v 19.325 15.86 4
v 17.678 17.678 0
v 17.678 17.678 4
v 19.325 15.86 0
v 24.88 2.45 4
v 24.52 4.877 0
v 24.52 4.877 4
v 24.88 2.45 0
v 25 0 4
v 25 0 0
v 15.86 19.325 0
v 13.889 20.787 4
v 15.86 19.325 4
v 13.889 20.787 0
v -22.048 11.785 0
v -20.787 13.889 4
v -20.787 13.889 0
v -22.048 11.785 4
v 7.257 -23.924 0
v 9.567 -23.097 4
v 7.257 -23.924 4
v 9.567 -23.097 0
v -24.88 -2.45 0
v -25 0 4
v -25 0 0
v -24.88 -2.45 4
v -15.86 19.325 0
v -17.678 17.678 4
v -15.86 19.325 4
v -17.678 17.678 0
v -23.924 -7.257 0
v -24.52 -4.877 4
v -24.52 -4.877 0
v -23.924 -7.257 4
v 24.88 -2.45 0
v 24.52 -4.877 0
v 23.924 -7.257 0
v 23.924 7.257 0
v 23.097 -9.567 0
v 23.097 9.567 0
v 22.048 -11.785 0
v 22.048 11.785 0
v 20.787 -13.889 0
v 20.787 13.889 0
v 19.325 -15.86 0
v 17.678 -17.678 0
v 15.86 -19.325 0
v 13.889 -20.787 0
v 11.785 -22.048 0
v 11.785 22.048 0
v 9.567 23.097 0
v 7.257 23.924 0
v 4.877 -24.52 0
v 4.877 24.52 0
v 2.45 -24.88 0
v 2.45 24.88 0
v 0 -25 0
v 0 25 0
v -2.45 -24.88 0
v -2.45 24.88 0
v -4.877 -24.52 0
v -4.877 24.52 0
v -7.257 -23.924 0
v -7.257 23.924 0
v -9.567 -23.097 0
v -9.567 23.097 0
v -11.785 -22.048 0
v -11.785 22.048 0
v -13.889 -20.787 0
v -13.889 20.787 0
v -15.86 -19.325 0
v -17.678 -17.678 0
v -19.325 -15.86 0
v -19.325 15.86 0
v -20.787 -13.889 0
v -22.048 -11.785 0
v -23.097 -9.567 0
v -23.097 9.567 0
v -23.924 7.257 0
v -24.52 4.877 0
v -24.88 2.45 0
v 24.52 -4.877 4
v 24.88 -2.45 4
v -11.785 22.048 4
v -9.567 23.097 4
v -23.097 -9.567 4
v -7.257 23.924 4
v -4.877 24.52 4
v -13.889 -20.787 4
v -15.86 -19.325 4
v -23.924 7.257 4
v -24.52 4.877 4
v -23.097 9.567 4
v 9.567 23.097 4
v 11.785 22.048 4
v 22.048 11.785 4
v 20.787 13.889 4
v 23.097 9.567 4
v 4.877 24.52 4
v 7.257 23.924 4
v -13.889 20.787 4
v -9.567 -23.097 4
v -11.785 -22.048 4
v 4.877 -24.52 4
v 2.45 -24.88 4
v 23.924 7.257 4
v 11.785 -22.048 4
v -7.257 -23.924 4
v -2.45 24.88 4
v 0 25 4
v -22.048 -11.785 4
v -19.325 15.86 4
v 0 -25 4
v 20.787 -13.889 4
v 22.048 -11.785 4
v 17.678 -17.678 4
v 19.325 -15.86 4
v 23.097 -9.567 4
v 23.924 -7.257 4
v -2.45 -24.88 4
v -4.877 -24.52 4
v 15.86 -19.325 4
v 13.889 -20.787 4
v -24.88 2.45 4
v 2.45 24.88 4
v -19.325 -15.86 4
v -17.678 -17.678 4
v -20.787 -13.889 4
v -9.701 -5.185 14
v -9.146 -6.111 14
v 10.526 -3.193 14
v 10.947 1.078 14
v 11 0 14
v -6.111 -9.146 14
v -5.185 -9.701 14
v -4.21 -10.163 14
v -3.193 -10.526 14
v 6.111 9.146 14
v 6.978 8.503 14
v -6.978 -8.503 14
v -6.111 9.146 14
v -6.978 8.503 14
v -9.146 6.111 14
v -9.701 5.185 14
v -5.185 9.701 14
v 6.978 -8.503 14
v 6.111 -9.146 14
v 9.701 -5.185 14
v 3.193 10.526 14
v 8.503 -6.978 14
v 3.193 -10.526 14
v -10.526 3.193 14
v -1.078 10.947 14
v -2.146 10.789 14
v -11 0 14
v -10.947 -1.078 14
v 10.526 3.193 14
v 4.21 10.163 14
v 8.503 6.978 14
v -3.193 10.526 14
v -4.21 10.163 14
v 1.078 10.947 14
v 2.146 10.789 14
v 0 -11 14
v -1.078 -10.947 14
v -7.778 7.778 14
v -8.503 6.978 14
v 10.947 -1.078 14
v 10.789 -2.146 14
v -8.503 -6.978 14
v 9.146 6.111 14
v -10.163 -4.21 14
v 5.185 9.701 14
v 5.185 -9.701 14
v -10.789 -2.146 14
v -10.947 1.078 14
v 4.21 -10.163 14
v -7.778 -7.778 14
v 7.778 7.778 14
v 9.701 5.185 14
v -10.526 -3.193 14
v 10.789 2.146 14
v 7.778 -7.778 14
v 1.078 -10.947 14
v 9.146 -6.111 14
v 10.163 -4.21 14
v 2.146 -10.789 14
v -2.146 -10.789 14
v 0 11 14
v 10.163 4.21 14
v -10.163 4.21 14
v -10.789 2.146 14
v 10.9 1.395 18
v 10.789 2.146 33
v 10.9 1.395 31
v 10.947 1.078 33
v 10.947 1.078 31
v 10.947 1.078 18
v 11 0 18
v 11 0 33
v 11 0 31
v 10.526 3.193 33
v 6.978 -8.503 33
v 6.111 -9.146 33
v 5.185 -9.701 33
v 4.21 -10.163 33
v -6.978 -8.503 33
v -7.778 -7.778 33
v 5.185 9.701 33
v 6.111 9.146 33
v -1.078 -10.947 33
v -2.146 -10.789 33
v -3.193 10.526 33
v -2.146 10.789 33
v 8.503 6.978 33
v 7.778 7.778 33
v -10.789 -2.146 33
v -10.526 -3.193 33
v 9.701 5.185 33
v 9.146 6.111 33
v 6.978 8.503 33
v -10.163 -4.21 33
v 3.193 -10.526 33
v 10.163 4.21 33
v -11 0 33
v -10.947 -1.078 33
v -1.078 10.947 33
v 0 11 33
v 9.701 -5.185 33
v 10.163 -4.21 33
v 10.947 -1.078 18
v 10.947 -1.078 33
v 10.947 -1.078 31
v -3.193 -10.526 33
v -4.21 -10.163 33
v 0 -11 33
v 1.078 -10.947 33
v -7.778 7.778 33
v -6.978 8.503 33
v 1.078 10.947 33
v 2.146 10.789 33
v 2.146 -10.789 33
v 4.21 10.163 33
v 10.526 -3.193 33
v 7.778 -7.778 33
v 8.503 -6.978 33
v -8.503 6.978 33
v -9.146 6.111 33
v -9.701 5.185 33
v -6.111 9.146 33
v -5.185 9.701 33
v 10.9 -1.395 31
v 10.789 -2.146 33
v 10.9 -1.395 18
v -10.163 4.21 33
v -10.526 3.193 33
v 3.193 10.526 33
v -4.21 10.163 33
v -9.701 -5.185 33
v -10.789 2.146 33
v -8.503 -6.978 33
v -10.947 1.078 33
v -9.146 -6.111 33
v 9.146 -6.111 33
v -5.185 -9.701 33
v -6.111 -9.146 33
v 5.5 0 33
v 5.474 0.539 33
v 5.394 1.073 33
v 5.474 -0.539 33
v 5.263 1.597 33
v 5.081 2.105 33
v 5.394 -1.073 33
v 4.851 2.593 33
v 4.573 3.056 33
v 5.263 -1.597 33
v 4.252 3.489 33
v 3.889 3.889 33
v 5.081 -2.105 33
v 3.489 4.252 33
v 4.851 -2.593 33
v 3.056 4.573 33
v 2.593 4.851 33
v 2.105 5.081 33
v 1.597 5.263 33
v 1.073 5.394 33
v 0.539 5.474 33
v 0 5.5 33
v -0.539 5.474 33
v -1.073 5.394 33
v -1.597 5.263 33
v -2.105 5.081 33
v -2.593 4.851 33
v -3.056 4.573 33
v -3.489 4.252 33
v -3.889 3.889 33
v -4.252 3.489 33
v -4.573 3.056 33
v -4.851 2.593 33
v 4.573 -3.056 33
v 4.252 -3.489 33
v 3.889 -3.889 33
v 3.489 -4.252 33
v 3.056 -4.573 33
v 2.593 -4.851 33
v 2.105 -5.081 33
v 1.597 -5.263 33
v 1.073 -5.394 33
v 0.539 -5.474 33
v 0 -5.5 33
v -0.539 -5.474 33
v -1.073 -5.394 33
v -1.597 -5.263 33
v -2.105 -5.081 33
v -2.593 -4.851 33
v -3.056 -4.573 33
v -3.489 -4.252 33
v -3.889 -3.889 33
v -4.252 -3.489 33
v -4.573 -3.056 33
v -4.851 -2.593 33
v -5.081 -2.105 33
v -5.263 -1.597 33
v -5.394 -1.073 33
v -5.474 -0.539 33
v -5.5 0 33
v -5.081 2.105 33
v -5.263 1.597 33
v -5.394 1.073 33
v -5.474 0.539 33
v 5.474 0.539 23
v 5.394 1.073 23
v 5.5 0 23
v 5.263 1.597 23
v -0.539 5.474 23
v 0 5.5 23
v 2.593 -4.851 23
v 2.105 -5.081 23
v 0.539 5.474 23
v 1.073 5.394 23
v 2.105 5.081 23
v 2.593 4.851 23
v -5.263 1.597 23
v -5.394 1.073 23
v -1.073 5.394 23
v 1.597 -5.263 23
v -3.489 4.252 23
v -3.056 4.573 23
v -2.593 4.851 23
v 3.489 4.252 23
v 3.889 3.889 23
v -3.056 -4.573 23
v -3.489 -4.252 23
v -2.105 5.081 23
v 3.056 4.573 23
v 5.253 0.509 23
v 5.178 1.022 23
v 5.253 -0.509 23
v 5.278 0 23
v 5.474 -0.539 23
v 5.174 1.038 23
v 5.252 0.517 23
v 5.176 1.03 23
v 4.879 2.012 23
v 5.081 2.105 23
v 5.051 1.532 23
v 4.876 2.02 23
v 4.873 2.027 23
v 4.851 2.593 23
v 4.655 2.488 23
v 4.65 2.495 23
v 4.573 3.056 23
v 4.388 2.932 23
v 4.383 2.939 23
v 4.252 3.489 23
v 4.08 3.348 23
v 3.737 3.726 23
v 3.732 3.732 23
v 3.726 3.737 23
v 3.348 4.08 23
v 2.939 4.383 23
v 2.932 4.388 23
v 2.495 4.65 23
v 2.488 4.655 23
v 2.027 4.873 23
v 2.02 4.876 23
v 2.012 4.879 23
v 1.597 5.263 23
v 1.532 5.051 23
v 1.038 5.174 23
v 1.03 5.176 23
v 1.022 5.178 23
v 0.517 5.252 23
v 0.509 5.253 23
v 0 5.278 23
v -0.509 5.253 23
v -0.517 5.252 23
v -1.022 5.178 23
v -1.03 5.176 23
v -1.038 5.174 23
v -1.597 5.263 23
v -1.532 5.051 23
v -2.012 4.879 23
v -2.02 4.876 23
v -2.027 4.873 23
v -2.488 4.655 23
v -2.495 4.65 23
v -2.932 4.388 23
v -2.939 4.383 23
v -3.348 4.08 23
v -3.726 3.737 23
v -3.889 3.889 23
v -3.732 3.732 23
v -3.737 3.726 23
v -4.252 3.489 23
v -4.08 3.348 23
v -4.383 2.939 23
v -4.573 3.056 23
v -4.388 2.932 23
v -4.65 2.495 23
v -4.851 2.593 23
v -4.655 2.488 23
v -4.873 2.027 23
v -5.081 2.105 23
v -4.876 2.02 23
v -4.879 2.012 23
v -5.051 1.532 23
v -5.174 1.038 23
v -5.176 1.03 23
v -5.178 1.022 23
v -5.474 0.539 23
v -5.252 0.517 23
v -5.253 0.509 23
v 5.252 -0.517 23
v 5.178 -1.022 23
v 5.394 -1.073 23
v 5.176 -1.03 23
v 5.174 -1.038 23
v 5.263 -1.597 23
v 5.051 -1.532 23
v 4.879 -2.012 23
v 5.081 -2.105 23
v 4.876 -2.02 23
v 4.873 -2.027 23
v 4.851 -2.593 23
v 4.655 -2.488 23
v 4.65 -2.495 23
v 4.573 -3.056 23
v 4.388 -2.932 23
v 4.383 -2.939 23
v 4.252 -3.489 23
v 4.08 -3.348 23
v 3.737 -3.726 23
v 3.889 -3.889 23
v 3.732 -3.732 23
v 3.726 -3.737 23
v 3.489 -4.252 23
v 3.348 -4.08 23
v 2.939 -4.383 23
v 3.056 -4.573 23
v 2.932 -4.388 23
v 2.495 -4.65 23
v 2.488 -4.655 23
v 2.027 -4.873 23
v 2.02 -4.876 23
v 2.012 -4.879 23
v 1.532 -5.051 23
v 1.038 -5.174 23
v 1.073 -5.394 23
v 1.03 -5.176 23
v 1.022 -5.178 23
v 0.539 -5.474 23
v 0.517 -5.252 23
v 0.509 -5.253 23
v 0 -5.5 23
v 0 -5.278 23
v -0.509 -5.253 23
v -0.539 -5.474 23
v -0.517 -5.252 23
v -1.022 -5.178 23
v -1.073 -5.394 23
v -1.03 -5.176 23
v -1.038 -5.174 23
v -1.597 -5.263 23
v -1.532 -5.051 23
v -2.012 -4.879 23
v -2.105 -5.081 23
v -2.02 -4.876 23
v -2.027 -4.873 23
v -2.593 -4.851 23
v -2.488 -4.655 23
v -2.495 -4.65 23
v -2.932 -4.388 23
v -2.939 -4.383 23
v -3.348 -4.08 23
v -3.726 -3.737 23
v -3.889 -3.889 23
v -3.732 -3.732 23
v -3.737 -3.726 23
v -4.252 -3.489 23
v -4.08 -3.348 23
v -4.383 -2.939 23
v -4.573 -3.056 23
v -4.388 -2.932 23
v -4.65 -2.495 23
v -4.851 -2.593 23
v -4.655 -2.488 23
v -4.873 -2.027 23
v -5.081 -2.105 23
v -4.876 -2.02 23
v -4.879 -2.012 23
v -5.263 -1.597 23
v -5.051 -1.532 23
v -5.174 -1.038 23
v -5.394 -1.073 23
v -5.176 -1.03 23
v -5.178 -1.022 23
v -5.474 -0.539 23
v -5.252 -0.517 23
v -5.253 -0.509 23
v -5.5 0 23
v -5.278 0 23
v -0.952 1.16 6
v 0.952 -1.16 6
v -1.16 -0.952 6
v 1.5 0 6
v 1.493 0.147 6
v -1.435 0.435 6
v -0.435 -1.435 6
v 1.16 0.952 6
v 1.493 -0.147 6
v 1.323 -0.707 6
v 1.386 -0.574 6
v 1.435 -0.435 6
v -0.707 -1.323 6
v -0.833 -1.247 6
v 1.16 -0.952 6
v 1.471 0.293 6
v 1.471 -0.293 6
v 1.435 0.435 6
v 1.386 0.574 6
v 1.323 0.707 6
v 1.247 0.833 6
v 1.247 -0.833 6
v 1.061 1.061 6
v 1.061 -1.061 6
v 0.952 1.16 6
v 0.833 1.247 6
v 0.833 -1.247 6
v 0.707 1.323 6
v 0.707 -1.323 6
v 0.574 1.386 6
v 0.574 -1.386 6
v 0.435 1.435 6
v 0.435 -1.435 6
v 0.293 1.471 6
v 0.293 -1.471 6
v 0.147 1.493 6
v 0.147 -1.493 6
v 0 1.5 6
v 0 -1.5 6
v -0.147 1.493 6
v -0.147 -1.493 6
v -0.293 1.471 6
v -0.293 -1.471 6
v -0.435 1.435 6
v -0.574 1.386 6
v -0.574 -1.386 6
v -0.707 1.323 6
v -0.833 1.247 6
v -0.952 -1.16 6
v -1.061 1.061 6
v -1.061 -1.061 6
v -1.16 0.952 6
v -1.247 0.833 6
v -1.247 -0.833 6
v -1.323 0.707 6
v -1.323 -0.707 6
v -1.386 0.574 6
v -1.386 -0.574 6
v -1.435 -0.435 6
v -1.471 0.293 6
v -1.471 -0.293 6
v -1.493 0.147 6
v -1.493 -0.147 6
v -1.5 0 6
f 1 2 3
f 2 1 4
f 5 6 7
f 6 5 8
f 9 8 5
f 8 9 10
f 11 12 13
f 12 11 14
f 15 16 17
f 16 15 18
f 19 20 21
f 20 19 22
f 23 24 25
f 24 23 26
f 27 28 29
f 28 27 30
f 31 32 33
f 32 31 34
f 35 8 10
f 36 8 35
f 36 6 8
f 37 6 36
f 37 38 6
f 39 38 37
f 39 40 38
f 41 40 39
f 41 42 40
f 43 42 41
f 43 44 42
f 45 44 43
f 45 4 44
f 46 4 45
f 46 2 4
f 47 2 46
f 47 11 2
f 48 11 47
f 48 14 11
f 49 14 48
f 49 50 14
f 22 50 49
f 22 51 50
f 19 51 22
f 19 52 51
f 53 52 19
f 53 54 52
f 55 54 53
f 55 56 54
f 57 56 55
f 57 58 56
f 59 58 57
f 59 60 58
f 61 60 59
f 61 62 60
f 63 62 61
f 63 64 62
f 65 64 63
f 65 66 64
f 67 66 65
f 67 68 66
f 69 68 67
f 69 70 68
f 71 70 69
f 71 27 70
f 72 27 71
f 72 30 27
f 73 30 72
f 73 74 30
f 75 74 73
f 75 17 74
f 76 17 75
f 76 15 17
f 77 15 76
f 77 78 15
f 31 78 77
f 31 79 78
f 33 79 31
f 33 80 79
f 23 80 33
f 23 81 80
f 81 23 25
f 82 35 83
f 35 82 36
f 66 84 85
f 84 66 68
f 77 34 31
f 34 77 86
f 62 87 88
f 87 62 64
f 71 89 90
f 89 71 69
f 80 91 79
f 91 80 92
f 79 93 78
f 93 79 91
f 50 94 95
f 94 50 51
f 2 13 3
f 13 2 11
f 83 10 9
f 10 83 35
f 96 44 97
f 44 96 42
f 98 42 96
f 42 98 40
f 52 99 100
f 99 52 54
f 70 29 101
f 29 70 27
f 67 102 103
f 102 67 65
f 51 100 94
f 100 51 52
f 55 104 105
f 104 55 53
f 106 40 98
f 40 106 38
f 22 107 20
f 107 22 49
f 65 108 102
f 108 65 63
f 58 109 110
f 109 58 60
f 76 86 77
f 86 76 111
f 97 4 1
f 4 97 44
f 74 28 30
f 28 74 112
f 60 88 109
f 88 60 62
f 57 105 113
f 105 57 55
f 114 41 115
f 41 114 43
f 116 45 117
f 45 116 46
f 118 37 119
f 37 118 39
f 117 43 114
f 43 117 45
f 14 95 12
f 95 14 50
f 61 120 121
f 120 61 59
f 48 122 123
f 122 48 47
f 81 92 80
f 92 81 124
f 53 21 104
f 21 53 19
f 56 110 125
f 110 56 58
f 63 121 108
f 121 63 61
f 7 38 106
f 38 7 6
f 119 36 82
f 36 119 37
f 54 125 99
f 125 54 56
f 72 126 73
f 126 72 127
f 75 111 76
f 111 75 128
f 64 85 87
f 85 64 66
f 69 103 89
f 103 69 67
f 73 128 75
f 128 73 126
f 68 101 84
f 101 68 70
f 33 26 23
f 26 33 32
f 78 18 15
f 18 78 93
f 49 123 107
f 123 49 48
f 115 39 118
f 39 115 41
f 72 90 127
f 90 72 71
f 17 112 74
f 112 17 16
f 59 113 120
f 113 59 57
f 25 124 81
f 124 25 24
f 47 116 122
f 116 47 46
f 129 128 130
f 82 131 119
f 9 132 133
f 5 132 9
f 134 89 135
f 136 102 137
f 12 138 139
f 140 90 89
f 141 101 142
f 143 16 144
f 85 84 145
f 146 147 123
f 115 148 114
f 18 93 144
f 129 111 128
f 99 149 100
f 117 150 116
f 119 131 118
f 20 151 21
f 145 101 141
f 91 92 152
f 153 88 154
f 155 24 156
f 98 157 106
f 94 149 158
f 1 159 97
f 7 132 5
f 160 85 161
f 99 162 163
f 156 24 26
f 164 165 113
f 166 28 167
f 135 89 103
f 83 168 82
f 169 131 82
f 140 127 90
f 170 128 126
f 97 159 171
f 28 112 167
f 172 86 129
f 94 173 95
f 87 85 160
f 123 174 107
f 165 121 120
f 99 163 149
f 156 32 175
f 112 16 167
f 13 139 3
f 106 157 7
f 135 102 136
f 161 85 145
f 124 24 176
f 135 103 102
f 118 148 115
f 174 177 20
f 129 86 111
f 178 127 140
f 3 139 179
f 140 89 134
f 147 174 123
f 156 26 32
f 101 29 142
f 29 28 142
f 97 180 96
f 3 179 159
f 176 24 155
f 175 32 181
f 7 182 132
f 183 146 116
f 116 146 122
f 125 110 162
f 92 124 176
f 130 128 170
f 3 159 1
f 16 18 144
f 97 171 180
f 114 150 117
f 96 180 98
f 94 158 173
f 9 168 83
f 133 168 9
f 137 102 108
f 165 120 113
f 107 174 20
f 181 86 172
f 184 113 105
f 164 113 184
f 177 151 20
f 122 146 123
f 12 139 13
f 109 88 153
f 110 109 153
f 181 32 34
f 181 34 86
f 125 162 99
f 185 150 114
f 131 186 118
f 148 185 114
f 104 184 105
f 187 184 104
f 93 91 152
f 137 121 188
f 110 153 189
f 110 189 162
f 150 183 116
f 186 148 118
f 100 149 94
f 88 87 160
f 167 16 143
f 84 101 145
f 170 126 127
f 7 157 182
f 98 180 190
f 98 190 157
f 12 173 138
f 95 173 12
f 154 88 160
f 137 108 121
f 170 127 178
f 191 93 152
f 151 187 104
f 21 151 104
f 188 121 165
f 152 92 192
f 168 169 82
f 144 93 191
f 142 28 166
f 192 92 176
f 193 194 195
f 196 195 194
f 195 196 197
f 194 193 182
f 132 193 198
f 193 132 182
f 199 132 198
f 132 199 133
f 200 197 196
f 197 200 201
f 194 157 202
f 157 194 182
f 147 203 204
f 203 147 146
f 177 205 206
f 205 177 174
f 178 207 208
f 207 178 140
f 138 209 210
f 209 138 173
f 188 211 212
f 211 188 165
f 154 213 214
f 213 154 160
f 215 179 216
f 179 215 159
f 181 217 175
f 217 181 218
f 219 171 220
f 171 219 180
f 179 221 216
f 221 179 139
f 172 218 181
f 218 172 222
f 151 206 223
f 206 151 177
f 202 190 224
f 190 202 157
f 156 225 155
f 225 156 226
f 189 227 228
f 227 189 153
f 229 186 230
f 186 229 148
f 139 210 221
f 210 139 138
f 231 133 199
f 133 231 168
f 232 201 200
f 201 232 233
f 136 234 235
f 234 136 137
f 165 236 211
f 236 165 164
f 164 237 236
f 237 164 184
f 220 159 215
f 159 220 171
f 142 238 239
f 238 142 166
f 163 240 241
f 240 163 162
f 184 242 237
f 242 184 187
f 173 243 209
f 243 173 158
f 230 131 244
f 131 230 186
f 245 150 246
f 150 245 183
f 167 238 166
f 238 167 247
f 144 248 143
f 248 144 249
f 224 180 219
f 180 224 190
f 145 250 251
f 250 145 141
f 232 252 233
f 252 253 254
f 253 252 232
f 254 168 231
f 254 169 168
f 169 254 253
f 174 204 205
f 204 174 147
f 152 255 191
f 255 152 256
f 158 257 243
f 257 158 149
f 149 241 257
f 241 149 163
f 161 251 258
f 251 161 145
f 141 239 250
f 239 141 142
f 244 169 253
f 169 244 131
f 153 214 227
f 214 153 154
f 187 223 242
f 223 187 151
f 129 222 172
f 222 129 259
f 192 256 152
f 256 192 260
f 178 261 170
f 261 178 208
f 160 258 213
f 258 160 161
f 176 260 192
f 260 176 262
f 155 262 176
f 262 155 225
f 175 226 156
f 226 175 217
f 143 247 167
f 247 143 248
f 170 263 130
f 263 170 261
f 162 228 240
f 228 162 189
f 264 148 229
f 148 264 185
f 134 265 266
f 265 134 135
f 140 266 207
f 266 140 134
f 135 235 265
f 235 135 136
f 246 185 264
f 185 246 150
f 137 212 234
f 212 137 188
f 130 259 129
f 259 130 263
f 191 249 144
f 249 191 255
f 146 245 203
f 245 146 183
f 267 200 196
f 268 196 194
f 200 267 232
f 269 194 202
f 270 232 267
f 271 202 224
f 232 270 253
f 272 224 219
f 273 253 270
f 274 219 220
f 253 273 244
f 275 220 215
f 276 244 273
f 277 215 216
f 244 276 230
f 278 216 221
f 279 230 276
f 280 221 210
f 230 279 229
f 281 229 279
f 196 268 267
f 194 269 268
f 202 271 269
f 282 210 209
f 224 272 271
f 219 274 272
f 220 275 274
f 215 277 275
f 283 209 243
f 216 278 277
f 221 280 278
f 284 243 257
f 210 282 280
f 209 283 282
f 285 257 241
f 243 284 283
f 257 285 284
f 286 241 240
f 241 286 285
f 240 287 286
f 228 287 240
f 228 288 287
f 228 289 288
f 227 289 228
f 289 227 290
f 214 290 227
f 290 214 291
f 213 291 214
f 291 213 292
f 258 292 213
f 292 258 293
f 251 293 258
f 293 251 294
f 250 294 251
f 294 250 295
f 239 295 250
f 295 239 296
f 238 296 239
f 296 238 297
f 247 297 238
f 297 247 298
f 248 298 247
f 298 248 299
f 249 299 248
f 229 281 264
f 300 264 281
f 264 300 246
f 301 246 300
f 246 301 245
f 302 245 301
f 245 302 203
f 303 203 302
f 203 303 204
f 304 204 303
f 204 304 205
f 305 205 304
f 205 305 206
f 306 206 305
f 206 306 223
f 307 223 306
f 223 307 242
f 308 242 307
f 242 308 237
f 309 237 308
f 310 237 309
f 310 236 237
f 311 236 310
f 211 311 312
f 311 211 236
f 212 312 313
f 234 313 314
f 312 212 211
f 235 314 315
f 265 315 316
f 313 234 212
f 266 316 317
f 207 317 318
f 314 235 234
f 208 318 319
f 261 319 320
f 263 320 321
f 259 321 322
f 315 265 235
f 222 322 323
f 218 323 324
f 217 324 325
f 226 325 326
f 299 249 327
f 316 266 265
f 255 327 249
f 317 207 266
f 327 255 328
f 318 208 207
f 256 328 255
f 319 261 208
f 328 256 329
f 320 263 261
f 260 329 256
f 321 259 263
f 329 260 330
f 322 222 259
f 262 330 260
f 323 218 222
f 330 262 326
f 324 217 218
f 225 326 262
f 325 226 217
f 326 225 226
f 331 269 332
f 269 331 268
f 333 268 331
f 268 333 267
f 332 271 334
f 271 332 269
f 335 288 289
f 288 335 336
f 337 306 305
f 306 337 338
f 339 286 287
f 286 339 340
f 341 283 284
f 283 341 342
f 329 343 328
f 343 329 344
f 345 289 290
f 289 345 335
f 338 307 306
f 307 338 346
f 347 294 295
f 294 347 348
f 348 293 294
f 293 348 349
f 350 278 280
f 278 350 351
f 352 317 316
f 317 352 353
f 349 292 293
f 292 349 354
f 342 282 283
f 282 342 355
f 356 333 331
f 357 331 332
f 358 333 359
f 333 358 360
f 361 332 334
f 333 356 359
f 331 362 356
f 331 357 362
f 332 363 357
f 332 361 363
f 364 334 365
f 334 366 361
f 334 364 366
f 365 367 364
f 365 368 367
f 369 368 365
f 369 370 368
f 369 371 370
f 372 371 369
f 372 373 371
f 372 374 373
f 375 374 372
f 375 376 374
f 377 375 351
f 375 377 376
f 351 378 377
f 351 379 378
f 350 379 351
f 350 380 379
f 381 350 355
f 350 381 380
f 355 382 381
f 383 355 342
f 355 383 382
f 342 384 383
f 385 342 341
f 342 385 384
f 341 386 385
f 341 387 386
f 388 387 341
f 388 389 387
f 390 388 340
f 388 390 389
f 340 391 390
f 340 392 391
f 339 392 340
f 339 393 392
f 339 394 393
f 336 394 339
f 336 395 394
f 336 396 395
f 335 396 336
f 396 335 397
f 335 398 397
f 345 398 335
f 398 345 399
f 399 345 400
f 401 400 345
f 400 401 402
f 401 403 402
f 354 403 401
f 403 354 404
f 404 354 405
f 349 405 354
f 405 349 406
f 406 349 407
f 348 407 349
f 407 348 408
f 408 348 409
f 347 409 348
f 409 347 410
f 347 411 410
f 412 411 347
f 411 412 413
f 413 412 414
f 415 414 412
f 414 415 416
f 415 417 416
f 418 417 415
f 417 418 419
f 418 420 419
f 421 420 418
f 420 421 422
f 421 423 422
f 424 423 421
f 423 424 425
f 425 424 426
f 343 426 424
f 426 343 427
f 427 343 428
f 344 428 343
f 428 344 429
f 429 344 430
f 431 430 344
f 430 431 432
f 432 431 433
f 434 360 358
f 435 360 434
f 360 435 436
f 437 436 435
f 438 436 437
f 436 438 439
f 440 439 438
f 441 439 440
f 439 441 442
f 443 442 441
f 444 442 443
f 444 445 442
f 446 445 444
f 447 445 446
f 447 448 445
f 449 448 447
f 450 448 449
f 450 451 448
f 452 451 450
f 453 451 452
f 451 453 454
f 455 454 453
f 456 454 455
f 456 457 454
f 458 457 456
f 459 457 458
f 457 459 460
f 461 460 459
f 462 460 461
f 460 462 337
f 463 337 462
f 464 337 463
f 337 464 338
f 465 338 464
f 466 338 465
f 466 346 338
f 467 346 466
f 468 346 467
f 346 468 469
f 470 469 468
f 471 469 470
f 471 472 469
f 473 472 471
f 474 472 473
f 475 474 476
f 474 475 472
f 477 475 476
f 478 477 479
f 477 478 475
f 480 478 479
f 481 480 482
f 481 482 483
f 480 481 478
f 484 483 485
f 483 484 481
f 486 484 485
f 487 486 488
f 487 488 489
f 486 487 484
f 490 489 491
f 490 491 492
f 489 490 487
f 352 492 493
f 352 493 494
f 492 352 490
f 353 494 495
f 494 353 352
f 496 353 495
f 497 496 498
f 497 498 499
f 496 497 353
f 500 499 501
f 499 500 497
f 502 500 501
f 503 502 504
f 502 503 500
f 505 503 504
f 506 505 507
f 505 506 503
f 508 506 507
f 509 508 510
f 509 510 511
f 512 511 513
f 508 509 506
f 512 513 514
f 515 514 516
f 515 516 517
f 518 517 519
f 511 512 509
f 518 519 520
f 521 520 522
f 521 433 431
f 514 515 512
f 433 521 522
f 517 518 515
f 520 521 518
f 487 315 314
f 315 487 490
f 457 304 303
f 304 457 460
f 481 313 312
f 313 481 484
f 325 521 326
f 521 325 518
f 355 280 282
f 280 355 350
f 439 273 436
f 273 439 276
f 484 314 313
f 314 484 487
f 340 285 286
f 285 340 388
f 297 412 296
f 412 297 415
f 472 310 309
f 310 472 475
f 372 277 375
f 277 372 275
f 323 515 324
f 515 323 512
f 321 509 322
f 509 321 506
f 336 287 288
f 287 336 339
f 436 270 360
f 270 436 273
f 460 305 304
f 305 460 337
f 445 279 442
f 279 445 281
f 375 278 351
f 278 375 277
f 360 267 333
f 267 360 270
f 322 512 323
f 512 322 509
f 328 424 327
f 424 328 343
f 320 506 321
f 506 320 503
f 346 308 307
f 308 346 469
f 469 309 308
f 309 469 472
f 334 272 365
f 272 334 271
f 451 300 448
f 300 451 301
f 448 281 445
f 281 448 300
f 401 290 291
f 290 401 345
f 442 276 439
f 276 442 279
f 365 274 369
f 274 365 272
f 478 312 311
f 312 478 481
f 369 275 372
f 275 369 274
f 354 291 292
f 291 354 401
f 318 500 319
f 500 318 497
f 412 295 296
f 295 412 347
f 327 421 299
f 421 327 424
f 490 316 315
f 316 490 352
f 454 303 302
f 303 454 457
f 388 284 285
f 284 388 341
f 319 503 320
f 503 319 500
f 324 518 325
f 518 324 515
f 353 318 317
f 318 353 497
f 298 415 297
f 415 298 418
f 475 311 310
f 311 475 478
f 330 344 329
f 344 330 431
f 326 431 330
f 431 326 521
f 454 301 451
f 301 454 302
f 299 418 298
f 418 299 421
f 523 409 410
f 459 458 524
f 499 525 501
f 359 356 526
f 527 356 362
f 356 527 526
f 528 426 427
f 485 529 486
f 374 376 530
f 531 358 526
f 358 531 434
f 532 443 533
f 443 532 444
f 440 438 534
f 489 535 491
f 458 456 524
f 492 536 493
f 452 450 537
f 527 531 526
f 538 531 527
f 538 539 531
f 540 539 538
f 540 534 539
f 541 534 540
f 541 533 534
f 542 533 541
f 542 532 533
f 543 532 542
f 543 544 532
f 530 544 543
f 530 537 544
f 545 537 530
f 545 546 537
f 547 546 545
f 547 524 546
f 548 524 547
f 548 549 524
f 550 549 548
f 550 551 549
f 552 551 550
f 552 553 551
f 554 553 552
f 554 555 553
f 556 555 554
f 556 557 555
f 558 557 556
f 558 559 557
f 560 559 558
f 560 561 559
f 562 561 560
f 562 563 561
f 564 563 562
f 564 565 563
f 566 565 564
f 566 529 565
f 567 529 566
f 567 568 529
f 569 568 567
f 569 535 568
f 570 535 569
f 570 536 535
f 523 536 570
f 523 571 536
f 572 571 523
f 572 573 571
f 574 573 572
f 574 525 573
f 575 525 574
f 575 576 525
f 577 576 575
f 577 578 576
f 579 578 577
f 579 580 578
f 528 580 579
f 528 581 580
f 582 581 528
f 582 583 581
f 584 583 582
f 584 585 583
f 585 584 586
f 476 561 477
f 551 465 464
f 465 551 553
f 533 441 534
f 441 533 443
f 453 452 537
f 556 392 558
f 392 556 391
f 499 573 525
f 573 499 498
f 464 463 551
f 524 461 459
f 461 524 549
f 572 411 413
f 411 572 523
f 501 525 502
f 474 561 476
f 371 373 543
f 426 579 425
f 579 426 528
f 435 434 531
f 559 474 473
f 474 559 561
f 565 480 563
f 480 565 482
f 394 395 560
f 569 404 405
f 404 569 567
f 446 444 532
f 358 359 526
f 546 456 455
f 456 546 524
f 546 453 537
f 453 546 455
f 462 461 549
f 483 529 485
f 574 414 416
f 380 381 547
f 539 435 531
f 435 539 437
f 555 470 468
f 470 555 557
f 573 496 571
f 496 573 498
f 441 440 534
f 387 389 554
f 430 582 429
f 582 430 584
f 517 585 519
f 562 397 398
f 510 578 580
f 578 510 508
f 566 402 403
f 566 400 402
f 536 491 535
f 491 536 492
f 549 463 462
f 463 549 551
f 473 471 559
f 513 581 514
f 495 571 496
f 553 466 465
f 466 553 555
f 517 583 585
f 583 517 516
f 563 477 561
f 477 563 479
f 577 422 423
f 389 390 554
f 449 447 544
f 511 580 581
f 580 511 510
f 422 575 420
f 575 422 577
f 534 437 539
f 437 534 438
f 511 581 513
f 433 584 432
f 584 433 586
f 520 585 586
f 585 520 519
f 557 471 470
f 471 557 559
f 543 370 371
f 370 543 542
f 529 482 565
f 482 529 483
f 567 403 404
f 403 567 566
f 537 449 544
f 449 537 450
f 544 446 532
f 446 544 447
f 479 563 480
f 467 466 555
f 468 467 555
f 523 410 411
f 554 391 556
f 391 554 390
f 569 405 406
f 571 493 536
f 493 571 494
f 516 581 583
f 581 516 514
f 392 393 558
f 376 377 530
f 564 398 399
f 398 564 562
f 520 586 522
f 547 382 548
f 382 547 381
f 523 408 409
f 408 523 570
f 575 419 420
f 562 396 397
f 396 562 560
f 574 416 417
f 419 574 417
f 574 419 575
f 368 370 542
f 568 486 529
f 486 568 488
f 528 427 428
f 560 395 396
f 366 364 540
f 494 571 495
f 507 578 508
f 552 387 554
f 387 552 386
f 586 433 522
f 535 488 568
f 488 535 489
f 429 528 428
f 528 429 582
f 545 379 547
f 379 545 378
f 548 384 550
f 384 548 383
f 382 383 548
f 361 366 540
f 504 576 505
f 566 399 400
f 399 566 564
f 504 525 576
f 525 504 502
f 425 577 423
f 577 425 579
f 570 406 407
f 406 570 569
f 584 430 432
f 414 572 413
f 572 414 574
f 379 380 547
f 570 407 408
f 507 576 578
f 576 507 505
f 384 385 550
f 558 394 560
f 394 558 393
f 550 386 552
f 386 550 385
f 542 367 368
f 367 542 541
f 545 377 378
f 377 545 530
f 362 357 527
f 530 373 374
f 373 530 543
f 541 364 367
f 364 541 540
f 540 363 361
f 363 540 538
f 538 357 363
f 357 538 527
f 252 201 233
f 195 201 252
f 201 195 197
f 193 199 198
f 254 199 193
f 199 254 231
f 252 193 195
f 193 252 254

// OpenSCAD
// --- Dimensions ---
base_diameter = 50.0;       // Diameter of the base disc
base_height = 4.0;          // Height of the base disc
cone_bottom_dia = 50.0;     // Diameter at the bottom of the cone (z=4)
cone_top_dia = 22.0;        // Diameter at the top of the cone (z=14)
cone_height = 10.0;         // Height of the cone section (14 - 4)
column_diameter = 22.0;      // Diameter of the top column
column_height = 19.0;        // Height of the column (33 - 14)
total_height = 33.0;        // Total height of the object

// Tube Seat Dimensions
seat_top_dia = 11.0;        // Diameter of the cylindrical part of the seat
seat_top_z = 33.0;          // Z-coordinate at the top of the seat
seat_mid_z = 23.0;          // Z-coordinate where seat transitions to cone
seat_mid_dia = 11.0;        // Diameter at the transition point
seat_bottom_dia = 3.0;      // Diameter at the tip of the seat cone
seat_bottom_z = 6.0;        // Z-coordinate at the tip of the seat cone

// Viewing Window Dimensions
window_width_y = 4.0;       // Width of the window in Y direction
window_height_start = 18.0; // Z-coordinate where window starts
window_height_end = 30.0;   // Z-coordinate where window ends
window_offset_x = 0.01;     // Small offset to ensure clean cut

// --- Parameters ---
$fn = 64;

// --- Main Construction ---

difference() {
    // THE SOLID BODY
    union() {
        // 1. The Base Disc
        cylinder(d = base_diameter, h = base_height);

        // 2. The Cone Section
        translate([0, 0, base_height])
        cylinder(d1 = cone_bottom_dia, d2 = cone_top_dia, h = cone_height);

        // 3. The Top Column
        translate([0, 0, base_height + cone_height])
        cylinder(d = column_diameter, h = column_height);
    }

    // THE TUBE SEAT (Subtracted)
    // Part 1: Cylindrical seat (z=23 to z=33)
    translate([0, 0, seat_mid_z])
    cylinder(d = seat_top_dia, h = seat_top_z - seat_mid_z + 1);
    
    // Part 2: Conical seat (z=6 to z=23)
    translate([0, 0, seat_bottom_z])
    cylinder(d1 = seat_bottom_dia, d2 = seat_mid_dia, h = seat_mid_z - seat_bottom_z + 1);

    // THE VIEWING WINDOW (Subtracted)
    // The window is cut through the column wall on the +X side.
    // It is 4mm wide in Y, meaning it spans from Y = -2 to Y = 2.
    // It is cut "straight through the column wall on the +X side".
    // We use a large cube to ensure it cuts through the entire side of the column.
    translate([column_diameter/2 - 0.1, -window_width_y/2, window_height_start])
    cube([column_diameter, window_width_y, window_height_end - window_height_start + 1]);
}
